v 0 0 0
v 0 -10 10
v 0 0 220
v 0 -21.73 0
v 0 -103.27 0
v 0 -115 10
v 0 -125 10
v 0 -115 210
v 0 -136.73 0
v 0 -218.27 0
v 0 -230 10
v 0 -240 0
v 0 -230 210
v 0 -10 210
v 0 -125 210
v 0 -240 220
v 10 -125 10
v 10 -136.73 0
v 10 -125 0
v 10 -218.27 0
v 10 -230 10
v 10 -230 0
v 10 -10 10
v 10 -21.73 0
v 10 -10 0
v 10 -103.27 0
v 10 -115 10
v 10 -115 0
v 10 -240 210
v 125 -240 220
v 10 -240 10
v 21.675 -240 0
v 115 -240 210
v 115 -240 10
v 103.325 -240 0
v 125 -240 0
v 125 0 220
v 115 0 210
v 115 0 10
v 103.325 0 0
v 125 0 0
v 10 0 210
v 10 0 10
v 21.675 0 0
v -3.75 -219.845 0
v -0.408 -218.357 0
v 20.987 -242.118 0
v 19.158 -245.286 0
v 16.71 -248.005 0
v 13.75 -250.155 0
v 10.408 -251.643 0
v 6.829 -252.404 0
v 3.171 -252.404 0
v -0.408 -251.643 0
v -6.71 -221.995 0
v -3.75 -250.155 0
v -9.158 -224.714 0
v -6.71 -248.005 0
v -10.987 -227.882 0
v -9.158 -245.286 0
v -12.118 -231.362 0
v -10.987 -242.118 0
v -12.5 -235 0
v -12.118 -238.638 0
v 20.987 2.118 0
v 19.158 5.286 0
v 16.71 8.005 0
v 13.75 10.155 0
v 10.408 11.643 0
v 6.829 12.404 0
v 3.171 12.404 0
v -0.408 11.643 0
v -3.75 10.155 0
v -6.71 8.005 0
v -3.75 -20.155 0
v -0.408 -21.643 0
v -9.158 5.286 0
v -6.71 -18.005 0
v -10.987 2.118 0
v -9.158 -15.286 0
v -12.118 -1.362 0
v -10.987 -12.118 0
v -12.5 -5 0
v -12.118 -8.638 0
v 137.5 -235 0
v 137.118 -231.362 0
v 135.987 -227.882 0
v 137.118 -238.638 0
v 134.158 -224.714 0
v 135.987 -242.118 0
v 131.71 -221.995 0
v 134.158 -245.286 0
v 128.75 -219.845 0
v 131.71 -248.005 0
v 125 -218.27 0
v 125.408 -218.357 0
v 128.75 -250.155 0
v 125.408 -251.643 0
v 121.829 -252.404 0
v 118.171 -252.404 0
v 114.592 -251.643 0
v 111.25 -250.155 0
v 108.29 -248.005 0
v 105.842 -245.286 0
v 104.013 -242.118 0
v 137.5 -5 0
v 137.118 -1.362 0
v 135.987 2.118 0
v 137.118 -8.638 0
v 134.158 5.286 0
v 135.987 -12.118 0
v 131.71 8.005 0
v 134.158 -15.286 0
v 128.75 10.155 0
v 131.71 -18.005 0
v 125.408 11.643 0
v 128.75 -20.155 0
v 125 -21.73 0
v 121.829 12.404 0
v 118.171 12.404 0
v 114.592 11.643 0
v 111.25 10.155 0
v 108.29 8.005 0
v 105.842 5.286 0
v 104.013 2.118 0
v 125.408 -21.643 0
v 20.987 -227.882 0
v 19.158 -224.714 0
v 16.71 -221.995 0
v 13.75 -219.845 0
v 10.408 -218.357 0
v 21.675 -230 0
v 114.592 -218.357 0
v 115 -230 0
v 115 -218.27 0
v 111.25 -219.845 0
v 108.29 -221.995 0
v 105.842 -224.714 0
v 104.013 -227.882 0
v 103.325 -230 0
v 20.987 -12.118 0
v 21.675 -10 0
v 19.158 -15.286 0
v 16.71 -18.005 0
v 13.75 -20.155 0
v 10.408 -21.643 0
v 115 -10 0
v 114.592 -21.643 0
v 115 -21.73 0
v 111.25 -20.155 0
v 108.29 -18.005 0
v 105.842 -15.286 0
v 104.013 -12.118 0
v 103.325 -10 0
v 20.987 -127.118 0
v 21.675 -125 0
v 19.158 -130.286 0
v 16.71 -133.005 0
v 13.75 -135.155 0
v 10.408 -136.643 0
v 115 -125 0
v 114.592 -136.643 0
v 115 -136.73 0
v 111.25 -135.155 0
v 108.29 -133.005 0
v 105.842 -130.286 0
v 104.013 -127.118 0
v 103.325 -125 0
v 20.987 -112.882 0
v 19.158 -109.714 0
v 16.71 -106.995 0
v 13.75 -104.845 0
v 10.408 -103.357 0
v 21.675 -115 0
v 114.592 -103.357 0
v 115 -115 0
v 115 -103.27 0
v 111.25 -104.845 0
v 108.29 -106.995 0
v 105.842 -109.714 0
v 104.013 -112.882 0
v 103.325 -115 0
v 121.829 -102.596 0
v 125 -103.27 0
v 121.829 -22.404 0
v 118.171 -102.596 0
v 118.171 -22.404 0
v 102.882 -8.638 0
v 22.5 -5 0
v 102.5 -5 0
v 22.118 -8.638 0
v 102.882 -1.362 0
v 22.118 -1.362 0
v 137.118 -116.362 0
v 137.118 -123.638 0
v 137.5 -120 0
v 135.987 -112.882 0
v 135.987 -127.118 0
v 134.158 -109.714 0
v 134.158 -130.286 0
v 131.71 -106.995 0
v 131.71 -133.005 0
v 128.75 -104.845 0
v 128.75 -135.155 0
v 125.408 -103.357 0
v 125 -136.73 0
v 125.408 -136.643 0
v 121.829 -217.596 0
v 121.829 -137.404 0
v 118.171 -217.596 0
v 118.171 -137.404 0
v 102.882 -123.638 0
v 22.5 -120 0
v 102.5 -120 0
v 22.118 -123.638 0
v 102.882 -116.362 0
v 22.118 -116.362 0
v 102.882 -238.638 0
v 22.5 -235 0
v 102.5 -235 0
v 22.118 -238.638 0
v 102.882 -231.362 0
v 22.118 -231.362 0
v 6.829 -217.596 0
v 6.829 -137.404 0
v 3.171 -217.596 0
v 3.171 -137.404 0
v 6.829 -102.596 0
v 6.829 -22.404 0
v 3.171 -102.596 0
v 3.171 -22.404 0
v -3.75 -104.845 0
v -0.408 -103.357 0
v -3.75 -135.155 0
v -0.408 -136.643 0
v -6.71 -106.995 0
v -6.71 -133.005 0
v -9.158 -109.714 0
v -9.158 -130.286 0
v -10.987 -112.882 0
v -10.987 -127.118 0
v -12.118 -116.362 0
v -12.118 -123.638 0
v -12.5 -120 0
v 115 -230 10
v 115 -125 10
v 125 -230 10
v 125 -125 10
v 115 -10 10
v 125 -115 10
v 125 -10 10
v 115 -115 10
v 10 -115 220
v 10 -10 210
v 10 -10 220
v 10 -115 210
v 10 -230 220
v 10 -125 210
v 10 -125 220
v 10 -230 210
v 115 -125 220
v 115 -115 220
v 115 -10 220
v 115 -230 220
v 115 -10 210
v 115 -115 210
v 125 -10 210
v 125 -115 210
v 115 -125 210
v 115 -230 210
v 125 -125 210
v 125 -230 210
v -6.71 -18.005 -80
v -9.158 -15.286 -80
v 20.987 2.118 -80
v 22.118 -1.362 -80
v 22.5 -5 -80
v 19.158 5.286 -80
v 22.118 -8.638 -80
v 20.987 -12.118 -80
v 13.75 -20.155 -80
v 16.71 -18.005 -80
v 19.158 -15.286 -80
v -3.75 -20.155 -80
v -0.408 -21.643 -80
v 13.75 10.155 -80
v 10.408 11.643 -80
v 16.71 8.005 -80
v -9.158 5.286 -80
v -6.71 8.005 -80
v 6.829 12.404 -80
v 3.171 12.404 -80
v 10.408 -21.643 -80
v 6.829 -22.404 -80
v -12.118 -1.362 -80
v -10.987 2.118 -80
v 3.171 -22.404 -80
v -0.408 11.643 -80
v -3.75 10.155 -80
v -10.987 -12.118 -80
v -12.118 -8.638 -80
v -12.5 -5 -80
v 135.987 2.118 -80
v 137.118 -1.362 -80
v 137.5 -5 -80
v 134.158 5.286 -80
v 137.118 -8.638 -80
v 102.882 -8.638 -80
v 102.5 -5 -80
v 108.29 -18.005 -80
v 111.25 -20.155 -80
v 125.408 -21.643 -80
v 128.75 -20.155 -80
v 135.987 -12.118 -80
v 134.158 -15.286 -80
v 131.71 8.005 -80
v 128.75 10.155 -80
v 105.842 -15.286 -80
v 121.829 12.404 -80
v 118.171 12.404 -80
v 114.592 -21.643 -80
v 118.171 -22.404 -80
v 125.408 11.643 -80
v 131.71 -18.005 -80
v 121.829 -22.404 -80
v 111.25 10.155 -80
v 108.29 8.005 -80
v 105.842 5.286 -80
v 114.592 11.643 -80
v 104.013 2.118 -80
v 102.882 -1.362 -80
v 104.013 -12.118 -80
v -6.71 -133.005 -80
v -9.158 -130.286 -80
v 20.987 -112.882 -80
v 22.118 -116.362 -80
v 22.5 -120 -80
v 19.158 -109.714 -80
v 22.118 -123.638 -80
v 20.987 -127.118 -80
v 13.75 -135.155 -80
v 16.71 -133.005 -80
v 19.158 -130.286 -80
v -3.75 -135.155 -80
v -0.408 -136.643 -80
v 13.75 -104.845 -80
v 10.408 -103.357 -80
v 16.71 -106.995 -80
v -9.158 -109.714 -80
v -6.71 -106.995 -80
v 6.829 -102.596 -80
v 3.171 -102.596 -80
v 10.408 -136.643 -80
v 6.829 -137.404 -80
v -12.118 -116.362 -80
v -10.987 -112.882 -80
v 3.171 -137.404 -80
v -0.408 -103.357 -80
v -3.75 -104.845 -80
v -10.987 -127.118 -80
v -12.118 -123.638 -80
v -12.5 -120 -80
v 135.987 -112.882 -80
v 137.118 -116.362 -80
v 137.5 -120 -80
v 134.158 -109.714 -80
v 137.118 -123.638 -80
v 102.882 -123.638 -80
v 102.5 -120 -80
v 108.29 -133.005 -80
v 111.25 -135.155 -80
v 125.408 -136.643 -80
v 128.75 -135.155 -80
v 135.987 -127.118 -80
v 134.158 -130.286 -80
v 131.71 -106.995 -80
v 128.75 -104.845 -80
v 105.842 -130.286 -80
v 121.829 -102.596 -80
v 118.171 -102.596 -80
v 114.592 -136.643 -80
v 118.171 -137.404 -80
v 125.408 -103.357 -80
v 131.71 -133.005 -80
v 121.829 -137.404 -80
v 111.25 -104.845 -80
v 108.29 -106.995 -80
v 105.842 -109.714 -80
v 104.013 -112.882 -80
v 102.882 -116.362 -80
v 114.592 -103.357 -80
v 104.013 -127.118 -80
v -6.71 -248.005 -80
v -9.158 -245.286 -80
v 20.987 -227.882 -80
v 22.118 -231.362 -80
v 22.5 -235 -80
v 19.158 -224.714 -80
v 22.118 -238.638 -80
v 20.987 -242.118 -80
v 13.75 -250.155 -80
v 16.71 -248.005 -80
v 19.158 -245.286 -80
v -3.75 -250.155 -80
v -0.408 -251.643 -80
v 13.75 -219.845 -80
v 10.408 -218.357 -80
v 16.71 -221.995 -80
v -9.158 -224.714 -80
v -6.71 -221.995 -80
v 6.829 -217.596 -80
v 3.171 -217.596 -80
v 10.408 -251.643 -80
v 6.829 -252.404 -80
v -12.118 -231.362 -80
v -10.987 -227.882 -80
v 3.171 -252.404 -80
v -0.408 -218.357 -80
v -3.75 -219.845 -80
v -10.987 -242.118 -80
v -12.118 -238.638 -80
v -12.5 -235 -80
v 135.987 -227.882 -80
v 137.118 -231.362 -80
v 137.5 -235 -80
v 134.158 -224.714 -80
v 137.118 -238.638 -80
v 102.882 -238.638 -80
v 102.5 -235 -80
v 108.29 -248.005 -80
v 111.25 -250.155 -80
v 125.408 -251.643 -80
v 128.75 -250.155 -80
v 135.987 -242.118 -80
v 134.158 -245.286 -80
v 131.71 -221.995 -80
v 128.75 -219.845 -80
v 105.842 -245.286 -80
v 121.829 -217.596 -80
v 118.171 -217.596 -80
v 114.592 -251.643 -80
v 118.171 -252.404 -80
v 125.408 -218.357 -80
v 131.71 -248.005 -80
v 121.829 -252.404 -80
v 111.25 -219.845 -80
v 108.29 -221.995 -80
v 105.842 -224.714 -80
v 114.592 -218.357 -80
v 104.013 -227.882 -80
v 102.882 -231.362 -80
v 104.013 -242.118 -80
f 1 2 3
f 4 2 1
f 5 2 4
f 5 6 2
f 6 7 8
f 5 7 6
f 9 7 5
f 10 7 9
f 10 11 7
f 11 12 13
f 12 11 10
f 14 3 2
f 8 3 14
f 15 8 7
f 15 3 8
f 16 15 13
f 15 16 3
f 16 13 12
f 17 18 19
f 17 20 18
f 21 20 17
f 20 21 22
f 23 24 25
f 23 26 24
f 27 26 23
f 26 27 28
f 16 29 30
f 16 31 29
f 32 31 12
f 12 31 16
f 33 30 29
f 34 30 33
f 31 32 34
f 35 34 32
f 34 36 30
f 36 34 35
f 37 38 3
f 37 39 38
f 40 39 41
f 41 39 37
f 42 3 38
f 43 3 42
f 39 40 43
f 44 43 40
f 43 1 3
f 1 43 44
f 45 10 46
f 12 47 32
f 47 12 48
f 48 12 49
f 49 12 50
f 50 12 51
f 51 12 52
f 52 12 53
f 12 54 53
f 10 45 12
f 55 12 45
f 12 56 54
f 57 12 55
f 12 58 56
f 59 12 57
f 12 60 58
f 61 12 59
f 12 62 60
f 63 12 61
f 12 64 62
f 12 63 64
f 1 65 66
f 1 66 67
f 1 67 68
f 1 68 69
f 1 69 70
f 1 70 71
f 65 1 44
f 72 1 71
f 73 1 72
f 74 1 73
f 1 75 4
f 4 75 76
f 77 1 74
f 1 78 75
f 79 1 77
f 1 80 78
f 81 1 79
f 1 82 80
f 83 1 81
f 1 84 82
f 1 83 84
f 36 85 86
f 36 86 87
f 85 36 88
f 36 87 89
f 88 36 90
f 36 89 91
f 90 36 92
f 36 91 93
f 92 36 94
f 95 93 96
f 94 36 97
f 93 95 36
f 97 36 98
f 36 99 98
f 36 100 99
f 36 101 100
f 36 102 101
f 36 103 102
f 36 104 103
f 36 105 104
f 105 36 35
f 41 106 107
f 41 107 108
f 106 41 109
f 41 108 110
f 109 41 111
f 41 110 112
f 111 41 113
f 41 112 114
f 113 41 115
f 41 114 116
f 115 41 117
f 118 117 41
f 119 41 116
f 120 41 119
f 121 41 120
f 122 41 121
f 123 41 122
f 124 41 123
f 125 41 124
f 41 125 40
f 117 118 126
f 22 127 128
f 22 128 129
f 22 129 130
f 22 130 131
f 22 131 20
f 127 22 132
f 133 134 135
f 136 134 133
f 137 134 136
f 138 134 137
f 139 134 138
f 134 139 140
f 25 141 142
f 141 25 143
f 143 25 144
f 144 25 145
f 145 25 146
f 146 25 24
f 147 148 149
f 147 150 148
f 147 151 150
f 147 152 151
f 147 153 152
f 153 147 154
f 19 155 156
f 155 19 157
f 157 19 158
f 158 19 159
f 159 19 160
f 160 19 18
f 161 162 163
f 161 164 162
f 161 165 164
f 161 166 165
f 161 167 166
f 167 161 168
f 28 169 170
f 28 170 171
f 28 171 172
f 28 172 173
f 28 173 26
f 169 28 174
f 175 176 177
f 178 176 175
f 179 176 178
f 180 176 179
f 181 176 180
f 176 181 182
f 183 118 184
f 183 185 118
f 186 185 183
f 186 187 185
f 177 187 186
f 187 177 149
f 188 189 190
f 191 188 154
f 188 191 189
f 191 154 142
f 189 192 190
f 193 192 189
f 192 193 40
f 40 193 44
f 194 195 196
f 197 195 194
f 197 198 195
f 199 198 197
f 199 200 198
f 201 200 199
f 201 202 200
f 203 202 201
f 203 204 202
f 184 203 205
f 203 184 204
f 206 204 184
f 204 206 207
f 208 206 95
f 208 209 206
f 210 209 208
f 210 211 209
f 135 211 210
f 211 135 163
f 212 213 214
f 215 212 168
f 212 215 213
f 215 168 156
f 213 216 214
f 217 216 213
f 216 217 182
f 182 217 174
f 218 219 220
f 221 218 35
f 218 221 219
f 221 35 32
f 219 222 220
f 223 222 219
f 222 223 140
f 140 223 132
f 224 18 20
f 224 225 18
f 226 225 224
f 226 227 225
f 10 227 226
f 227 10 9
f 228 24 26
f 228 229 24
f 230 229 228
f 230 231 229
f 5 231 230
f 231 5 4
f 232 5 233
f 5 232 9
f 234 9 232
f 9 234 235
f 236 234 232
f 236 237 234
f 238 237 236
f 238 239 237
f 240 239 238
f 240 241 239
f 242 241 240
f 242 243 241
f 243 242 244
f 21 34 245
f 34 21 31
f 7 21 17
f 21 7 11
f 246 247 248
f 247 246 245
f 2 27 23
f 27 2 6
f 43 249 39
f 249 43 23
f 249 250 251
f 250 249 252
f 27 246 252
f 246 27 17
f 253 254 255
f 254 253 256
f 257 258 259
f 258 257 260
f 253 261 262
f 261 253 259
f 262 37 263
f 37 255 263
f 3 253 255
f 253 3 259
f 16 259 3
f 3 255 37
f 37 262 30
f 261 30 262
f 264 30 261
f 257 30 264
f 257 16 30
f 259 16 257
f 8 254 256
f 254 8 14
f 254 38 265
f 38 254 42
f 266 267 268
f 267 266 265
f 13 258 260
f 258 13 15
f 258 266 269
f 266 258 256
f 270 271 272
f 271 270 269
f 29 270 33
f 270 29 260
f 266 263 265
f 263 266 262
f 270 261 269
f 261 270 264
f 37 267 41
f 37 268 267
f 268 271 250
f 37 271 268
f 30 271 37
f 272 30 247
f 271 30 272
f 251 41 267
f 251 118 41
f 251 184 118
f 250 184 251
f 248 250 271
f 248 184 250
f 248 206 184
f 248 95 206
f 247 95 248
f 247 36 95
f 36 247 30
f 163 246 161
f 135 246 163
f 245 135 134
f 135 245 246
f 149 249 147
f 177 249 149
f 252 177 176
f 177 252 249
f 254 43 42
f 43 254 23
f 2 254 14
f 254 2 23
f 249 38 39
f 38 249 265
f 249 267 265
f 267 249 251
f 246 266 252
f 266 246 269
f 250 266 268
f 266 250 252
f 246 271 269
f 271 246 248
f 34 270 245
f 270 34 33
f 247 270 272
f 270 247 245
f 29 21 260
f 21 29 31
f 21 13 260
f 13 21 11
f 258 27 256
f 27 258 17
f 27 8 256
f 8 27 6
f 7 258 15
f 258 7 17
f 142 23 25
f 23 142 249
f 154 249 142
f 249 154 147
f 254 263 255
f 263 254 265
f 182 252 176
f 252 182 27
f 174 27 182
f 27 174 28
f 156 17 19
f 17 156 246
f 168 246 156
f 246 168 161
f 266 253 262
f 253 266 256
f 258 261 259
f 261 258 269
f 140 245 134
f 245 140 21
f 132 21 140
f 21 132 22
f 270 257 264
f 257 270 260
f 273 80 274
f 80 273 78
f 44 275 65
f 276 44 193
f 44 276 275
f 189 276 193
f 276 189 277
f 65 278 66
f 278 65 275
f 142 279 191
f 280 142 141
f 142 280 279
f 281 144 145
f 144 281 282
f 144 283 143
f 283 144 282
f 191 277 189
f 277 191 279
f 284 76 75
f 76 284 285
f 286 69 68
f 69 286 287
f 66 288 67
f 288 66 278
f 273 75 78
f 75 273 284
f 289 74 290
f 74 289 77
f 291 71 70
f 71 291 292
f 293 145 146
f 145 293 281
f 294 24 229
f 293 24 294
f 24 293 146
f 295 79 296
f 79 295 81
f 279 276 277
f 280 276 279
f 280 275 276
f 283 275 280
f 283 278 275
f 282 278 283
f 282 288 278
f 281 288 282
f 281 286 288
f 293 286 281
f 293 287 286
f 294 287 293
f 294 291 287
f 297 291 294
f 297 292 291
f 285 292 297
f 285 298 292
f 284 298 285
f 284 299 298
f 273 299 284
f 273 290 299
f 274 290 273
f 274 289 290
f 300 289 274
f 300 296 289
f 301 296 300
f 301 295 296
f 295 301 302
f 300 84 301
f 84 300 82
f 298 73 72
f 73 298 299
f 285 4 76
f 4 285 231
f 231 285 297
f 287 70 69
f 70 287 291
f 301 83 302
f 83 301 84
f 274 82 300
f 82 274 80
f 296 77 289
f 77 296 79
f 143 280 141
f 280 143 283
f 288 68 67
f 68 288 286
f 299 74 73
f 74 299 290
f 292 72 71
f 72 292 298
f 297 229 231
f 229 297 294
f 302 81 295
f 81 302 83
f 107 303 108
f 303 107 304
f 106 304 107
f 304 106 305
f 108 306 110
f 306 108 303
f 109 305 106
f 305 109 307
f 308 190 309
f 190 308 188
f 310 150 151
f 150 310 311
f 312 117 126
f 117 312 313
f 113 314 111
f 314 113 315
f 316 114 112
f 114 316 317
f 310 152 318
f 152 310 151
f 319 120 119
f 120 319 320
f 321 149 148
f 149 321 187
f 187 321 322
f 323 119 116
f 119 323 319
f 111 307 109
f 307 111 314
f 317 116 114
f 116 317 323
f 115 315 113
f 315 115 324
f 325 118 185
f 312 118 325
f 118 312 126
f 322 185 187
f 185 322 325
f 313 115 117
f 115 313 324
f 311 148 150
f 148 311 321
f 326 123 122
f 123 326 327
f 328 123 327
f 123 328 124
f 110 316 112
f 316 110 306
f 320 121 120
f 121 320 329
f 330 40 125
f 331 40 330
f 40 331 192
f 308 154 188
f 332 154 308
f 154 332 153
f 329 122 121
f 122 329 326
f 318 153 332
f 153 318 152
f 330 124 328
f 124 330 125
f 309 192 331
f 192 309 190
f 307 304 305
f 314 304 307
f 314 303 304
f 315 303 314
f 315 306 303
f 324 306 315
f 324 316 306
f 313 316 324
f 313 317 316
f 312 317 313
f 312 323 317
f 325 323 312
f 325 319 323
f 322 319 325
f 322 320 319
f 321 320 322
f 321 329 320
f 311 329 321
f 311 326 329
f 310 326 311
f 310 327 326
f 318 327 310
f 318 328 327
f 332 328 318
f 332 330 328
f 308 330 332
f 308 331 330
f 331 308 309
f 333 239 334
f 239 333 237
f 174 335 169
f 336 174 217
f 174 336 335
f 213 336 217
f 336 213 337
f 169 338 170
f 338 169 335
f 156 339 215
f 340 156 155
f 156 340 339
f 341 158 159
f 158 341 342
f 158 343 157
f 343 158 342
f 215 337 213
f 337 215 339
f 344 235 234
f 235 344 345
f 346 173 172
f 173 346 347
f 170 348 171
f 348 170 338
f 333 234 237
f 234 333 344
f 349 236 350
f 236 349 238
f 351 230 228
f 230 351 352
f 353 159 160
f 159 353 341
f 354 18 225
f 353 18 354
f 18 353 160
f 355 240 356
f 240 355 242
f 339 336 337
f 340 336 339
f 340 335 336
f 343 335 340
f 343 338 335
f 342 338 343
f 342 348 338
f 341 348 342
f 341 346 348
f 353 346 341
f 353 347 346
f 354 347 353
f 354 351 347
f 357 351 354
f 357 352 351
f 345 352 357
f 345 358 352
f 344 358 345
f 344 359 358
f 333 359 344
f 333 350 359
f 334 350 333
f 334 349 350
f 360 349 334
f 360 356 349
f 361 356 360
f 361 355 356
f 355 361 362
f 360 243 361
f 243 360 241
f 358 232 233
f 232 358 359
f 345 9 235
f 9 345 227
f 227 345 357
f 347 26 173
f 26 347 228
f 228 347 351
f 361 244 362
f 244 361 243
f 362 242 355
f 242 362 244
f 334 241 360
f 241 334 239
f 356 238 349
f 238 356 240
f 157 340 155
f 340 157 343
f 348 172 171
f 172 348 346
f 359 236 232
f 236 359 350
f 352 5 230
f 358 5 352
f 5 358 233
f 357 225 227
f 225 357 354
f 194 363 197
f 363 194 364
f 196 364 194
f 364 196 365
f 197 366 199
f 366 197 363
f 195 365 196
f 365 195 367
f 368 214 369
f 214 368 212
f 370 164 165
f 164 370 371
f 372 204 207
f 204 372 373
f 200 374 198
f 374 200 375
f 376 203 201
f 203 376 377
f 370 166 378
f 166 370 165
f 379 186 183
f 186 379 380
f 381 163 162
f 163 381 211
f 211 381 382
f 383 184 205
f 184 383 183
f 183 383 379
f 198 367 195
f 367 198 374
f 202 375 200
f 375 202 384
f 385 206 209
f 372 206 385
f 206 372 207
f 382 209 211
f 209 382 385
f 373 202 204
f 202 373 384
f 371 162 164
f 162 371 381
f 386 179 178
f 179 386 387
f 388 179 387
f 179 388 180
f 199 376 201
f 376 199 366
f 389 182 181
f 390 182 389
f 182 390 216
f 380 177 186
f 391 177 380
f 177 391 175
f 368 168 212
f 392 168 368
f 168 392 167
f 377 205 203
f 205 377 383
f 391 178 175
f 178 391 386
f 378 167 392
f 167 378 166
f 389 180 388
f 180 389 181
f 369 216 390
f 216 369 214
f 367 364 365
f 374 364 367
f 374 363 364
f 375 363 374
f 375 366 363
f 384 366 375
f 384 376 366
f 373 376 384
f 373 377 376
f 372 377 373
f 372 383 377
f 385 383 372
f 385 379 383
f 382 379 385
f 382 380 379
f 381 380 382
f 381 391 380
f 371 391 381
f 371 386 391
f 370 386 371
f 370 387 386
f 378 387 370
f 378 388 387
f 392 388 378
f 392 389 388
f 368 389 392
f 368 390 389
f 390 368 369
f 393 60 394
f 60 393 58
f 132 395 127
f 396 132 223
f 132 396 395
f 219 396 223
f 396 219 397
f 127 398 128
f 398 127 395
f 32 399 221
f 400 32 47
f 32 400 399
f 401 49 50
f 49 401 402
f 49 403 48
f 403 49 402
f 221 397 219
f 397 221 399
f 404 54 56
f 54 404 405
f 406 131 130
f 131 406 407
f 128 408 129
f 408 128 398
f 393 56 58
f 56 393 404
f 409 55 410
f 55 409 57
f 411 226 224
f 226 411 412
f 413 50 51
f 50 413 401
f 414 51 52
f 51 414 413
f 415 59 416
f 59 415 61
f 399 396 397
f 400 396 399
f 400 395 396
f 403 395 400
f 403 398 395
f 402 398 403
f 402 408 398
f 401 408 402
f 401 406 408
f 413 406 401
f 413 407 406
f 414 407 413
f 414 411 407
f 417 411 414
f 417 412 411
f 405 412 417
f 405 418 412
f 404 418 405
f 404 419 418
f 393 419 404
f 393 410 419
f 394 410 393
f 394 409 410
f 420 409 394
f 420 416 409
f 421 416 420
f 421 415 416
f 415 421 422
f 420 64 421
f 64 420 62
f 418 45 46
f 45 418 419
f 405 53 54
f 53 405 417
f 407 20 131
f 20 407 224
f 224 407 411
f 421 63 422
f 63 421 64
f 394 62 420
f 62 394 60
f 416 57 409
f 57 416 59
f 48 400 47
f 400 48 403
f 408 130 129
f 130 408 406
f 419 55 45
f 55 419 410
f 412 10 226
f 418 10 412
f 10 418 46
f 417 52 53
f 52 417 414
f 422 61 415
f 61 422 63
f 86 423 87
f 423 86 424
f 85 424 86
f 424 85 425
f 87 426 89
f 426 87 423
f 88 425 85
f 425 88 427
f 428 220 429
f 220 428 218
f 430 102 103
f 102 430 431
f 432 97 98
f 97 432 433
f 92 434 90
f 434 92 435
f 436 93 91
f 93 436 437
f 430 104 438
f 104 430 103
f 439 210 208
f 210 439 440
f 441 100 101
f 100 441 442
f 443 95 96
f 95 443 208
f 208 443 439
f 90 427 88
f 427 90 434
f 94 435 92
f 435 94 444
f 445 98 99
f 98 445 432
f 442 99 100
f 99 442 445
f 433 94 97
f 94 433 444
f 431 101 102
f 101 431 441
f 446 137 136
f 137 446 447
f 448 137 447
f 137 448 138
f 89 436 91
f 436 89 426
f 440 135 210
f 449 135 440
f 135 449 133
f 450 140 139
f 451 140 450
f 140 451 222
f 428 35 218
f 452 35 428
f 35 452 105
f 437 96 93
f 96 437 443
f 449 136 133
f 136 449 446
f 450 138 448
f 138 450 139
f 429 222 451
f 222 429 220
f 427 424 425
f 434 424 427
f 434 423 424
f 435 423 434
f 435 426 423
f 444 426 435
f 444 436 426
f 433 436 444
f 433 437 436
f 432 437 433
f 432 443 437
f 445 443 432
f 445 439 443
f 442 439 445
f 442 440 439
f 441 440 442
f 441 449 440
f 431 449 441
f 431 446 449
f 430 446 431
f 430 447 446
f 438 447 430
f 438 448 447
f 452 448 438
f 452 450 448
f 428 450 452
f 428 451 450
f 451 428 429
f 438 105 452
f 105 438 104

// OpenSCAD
//Enter OpenSCAD code here.
module 200_balka(){
translate ([0, -10, 10])cube([10, 10, 200]);
}

module 125_balka(){
translate ([0, -10, 0])rotate([90, 0, 90]) cube([10, 10, 125]);
}

module 240_balka(){
rotate([90, 0, 0]) cube([10, 10, 240]);
}

module fundam(){
translate([5, -5, -80]) cylinder(r= 17.5, h= 80);}

//125_balka();
//200_balka();
//240_balka();

for (i = [[0, 0, 0], 
[0, 0, 210],
[115, 0, 210], [115, 0, 0]]){ translate(i) 240_balka();}

for (i = [
[0, 0, 0], 
[115, 0, 0],
[115, -115, 0], 
[115, -230, 0],
[0, -230, 0],
[0, -115, 0]]){ translate(i) 200_balka();}


for (i = [
[0, 0, 0], 
[0, 0, 210],
[0, -115, 0], 
[0, -115, 210],
[0, -230, 0],
[0, -230, 210]]){ translate(i) 125_balka();}


for (i = [
[0, 0, 0], 
[115, 0, 0],
[0, -115, 0], 
[115, -115, 0],
[0, -230, 0],
[115, -230, 0]]){ translate(i) fundam();}
 echo("Version:",version());
